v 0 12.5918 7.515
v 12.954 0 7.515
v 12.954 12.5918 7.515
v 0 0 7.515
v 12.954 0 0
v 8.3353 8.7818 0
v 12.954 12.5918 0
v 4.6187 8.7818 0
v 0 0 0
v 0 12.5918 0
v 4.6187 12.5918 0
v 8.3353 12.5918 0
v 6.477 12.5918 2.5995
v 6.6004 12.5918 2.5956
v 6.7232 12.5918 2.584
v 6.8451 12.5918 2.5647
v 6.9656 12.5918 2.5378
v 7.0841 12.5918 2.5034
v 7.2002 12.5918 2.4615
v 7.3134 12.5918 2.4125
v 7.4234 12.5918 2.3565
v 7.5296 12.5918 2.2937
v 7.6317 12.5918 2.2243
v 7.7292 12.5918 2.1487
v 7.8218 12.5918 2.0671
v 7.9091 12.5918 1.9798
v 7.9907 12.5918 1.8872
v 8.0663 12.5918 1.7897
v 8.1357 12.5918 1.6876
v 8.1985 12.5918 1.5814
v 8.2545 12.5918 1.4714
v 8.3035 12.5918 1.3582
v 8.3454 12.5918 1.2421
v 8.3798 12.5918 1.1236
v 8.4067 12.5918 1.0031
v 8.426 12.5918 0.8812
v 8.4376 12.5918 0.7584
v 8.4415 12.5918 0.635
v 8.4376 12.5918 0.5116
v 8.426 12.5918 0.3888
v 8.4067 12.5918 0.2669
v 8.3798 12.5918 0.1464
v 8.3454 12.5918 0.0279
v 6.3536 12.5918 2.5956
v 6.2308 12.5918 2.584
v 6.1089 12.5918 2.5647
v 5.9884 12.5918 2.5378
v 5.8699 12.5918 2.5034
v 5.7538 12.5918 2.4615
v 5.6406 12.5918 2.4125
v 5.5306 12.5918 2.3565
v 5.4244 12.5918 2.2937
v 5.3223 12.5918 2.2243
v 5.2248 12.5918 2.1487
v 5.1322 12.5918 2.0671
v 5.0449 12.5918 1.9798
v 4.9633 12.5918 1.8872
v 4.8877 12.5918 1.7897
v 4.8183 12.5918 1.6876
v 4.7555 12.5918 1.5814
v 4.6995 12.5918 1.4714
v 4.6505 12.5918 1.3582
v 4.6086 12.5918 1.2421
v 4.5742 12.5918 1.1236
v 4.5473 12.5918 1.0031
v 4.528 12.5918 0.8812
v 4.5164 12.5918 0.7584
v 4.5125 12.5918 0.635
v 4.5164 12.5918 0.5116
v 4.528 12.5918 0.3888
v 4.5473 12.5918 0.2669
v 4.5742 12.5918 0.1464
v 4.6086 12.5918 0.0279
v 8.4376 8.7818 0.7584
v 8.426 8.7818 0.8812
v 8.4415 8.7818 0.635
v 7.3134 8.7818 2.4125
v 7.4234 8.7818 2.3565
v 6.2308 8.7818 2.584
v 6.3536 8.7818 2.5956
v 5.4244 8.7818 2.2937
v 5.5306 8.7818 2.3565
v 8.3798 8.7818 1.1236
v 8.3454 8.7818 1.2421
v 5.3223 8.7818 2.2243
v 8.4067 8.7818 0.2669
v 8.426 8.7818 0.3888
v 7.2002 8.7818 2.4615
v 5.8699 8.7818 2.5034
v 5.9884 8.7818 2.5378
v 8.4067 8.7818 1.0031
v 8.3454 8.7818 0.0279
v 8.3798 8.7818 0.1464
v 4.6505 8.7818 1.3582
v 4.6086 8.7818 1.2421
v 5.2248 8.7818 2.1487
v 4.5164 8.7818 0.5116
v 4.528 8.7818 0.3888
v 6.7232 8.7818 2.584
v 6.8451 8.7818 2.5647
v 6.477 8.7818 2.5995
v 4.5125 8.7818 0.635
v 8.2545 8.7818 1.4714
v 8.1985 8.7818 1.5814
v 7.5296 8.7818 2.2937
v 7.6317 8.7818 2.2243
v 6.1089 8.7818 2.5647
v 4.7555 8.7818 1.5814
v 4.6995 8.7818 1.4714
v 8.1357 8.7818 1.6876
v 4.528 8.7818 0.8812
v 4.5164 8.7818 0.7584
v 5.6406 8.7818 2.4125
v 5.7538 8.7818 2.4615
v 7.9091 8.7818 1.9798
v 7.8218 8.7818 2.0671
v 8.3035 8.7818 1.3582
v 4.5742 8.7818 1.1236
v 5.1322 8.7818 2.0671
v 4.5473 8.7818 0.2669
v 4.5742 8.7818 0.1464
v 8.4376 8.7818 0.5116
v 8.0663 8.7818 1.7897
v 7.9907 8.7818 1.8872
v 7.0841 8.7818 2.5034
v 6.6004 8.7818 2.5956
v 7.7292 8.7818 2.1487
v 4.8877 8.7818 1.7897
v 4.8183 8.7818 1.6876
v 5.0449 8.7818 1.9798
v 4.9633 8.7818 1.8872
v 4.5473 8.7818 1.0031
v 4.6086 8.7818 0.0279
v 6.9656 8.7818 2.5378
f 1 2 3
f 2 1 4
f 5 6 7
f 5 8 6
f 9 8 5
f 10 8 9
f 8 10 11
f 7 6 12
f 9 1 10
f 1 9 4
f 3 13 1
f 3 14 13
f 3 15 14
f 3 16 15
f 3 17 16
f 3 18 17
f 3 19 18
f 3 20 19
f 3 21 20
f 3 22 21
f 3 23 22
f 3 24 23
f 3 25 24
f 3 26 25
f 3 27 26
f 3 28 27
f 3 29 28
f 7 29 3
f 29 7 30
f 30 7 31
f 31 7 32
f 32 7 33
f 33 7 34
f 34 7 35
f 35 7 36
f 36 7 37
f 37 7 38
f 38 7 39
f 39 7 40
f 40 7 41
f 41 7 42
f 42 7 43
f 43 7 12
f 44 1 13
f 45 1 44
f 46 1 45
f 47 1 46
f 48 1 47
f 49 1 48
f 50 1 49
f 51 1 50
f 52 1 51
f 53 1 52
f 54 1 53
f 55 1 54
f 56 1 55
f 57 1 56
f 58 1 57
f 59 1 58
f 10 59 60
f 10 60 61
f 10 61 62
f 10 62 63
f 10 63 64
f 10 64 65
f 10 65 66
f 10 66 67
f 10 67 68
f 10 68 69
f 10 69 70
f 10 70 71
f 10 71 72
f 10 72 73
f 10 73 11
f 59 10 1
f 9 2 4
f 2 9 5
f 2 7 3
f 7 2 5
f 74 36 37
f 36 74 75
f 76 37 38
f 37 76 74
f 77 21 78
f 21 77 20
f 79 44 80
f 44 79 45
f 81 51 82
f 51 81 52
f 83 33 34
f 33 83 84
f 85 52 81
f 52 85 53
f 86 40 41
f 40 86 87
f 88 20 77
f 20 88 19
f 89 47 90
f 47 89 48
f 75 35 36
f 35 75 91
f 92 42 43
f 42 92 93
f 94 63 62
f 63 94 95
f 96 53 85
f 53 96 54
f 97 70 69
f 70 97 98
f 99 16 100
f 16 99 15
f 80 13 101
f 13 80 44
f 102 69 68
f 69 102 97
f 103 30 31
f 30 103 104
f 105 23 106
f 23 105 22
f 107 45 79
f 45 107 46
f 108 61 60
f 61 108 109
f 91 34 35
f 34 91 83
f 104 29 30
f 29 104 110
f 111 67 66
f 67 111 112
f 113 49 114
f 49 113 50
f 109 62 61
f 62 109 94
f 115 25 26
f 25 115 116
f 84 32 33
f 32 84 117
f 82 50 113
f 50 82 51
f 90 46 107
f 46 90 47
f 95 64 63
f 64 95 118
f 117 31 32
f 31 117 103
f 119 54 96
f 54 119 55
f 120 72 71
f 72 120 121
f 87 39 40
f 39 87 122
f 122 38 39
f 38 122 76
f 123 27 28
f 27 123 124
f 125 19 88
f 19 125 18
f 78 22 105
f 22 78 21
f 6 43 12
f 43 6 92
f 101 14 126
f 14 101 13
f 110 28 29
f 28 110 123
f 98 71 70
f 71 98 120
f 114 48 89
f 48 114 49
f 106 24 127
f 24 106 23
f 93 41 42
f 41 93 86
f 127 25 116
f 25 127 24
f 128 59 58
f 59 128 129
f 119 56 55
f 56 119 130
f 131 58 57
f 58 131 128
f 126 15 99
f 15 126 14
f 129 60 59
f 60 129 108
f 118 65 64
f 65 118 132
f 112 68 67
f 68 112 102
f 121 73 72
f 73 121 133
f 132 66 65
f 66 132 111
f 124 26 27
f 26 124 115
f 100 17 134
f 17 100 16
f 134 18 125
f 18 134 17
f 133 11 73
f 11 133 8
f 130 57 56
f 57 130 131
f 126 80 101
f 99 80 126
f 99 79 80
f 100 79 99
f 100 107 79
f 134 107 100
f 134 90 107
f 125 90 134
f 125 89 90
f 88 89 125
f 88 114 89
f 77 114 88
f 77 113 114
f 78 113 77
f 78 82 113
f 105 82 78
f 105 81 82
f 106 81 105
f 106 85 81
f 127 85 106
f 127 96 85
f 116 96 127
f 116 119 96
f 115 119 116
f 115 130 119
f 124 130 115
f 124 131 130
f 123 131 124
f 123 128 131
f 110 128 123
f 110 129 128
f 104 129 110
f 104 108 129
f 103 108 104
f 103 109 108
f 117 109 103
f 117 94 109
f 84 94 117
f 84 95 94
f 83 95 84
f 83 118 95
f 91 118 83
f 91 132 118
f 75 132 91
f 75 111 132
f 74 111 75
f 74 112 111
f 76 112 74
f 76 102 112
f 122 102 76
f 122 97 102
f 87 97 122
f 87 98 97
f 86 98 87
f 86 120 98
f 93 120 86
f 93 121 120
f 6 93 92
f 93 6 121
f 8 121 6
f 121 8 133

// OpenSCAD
module ResetButtonHolder(wallThickness){
  difference () {
    Holder();
    #Cutout();
  };
  module prism(l, w, h){
    polyhedron(
      points=[[0,0,0], [l,0,0], [l,w,0], [0,w,0], [0,w,h], [l,w,h]],
      faces=[[0,1,2,3],[5,4,3,2],[0,4,5,1],[0,3,4],[5,2,1]]
    );
  }

  buttonBodyY = 6.35;
  metalThickness = 0.4318;
  buttonY = buttonBodyY + metalThickness;
  buttonDiameter = 3.429; //0.135"
  buttonHeight = 1.143; //0.045"
  module ResetButton(){
    gapFromBottomOfBodyToBottomOfMetal = 1.8;
    union(){
      //silver plate around switch body
      color ("silver") union(){
        translate([0.0,0,gapFromBottomOfBodyToBottomOfMetal]) cube([metalThickness, buttonBodyY, 5.08]);//left metal
        translate([6.4,0,gapFromBottomOfBodyToBottomOfMetal]) cube([metalThickness, buttonBodyY, 5.08]);//right metal
        translate([metalThickness,5.9182,0])  cube([5.969,metalThickness,buttonBodyY]); //face plate
      }
      //black body of reset button
      translate([metalThickness,2.3876,0])
        color ("black") cube([5.969, 3.5306, 5.969]);

      // black button on switch
      translate([3.5306, 7.493, 3.175]) rotate([90,0,0])
        color ("red") cylinder(h=buttonHeight, d=buttonDiameter, $fn=100);
    }
  }

  module Cutout() {
    union(){
      translate([holderX/2, wallThickness + wall + buttonY, buttonFloor])
      rotate([90,0,0])
        cylinder(h=wallThickness, d=3.429+.5, $fn=100);

    };
    // // cutout hole for the reset button
    // // cube cutout for body of the reset button
    // translate([
    //   (resetButtonCenterOffset/2)-clearance,
    //   buttonBackWall + (6.35-3.5306-metalThickness-clearance)/*distance from back of prongs to back of button*/,
    //   buttonFloor
    // ])
    //   cube (size=[
    //     metalThickness + metalThickness + 5.969 + (clearance * 2),
    //     metalThickness + 3.5306 + clearance,
    //     (holderZ - buttonFloor) + clearance
    //   ]);
    // // cube cutout to hold the reset button in place
    // translate([
    //   (resetButtonCenterOffset/2)-clearance,
    //   buttonBackWall - clearance,
    //   (buttonFloor + 1.8) - clearance
    // ])
    //   cube (size=[
    //     metalThickness + metalThickness + 5.969 + (clearance * 2), // 0.8318
    //     6.35 - (metalThickness + 3.5306), // 2.3876
    //     5.08 + (clearance * 2) // 5.48
    //   ]);
    // translate([
    //   (resetButtonCenterOffset/2)-clearance,
    //   buttonBackWall + (6.35-3.5306-metalThickness-clearance),
    //   (buttonFloor + 1.3) - clearance
    // ])
    //   rotate([90,0,0]) prism(
    //     metalThickness + metalThickness + 5.969 + (clearance * 2),
    //     0.5,
    //     0.5
    //   );
  }

  wall = 2; //thickness of the holder wall around back and sides
  holderX = 12.954;
  holderZ = 7.515;
  middleMinusWalls = holderX - (wall * 2);
  module Holder() {
    union(){
      translate([0, 0, 0])                 cube([wall, wall + buttonY + wallThickness, holderZ]);
      translate([holderX - wall, 0, 0])    cube([wall, wall + buttonY + wallThickness, holderZ]);
      translate([wall, 0, 0])              cube([middleMinusWalls, wall, holderZ]);
      translate([wall, wall, 0])           cube([middleMinusWalls, buttonY,holderZ]);
      translate([0, wall + buttonY, 0]) cube([holderX, wallThickness,holderZ]);
    };
  }
  buttonFloor = 0.635;
  buttonBackWall = 2.54;
  // resetButtonCenterOffset = holderX
  //   - metalThickness /* left metal  */
  //   - 5.969  /* body        */
  //   - metalThickness /* right metal */;
  // *translate([resetButtonCenterOffset/2, buttonBackWall, buttonFloor]) ResetButton();
  clearance = 0.2;
}
ResetButtonHolder(3.81);
